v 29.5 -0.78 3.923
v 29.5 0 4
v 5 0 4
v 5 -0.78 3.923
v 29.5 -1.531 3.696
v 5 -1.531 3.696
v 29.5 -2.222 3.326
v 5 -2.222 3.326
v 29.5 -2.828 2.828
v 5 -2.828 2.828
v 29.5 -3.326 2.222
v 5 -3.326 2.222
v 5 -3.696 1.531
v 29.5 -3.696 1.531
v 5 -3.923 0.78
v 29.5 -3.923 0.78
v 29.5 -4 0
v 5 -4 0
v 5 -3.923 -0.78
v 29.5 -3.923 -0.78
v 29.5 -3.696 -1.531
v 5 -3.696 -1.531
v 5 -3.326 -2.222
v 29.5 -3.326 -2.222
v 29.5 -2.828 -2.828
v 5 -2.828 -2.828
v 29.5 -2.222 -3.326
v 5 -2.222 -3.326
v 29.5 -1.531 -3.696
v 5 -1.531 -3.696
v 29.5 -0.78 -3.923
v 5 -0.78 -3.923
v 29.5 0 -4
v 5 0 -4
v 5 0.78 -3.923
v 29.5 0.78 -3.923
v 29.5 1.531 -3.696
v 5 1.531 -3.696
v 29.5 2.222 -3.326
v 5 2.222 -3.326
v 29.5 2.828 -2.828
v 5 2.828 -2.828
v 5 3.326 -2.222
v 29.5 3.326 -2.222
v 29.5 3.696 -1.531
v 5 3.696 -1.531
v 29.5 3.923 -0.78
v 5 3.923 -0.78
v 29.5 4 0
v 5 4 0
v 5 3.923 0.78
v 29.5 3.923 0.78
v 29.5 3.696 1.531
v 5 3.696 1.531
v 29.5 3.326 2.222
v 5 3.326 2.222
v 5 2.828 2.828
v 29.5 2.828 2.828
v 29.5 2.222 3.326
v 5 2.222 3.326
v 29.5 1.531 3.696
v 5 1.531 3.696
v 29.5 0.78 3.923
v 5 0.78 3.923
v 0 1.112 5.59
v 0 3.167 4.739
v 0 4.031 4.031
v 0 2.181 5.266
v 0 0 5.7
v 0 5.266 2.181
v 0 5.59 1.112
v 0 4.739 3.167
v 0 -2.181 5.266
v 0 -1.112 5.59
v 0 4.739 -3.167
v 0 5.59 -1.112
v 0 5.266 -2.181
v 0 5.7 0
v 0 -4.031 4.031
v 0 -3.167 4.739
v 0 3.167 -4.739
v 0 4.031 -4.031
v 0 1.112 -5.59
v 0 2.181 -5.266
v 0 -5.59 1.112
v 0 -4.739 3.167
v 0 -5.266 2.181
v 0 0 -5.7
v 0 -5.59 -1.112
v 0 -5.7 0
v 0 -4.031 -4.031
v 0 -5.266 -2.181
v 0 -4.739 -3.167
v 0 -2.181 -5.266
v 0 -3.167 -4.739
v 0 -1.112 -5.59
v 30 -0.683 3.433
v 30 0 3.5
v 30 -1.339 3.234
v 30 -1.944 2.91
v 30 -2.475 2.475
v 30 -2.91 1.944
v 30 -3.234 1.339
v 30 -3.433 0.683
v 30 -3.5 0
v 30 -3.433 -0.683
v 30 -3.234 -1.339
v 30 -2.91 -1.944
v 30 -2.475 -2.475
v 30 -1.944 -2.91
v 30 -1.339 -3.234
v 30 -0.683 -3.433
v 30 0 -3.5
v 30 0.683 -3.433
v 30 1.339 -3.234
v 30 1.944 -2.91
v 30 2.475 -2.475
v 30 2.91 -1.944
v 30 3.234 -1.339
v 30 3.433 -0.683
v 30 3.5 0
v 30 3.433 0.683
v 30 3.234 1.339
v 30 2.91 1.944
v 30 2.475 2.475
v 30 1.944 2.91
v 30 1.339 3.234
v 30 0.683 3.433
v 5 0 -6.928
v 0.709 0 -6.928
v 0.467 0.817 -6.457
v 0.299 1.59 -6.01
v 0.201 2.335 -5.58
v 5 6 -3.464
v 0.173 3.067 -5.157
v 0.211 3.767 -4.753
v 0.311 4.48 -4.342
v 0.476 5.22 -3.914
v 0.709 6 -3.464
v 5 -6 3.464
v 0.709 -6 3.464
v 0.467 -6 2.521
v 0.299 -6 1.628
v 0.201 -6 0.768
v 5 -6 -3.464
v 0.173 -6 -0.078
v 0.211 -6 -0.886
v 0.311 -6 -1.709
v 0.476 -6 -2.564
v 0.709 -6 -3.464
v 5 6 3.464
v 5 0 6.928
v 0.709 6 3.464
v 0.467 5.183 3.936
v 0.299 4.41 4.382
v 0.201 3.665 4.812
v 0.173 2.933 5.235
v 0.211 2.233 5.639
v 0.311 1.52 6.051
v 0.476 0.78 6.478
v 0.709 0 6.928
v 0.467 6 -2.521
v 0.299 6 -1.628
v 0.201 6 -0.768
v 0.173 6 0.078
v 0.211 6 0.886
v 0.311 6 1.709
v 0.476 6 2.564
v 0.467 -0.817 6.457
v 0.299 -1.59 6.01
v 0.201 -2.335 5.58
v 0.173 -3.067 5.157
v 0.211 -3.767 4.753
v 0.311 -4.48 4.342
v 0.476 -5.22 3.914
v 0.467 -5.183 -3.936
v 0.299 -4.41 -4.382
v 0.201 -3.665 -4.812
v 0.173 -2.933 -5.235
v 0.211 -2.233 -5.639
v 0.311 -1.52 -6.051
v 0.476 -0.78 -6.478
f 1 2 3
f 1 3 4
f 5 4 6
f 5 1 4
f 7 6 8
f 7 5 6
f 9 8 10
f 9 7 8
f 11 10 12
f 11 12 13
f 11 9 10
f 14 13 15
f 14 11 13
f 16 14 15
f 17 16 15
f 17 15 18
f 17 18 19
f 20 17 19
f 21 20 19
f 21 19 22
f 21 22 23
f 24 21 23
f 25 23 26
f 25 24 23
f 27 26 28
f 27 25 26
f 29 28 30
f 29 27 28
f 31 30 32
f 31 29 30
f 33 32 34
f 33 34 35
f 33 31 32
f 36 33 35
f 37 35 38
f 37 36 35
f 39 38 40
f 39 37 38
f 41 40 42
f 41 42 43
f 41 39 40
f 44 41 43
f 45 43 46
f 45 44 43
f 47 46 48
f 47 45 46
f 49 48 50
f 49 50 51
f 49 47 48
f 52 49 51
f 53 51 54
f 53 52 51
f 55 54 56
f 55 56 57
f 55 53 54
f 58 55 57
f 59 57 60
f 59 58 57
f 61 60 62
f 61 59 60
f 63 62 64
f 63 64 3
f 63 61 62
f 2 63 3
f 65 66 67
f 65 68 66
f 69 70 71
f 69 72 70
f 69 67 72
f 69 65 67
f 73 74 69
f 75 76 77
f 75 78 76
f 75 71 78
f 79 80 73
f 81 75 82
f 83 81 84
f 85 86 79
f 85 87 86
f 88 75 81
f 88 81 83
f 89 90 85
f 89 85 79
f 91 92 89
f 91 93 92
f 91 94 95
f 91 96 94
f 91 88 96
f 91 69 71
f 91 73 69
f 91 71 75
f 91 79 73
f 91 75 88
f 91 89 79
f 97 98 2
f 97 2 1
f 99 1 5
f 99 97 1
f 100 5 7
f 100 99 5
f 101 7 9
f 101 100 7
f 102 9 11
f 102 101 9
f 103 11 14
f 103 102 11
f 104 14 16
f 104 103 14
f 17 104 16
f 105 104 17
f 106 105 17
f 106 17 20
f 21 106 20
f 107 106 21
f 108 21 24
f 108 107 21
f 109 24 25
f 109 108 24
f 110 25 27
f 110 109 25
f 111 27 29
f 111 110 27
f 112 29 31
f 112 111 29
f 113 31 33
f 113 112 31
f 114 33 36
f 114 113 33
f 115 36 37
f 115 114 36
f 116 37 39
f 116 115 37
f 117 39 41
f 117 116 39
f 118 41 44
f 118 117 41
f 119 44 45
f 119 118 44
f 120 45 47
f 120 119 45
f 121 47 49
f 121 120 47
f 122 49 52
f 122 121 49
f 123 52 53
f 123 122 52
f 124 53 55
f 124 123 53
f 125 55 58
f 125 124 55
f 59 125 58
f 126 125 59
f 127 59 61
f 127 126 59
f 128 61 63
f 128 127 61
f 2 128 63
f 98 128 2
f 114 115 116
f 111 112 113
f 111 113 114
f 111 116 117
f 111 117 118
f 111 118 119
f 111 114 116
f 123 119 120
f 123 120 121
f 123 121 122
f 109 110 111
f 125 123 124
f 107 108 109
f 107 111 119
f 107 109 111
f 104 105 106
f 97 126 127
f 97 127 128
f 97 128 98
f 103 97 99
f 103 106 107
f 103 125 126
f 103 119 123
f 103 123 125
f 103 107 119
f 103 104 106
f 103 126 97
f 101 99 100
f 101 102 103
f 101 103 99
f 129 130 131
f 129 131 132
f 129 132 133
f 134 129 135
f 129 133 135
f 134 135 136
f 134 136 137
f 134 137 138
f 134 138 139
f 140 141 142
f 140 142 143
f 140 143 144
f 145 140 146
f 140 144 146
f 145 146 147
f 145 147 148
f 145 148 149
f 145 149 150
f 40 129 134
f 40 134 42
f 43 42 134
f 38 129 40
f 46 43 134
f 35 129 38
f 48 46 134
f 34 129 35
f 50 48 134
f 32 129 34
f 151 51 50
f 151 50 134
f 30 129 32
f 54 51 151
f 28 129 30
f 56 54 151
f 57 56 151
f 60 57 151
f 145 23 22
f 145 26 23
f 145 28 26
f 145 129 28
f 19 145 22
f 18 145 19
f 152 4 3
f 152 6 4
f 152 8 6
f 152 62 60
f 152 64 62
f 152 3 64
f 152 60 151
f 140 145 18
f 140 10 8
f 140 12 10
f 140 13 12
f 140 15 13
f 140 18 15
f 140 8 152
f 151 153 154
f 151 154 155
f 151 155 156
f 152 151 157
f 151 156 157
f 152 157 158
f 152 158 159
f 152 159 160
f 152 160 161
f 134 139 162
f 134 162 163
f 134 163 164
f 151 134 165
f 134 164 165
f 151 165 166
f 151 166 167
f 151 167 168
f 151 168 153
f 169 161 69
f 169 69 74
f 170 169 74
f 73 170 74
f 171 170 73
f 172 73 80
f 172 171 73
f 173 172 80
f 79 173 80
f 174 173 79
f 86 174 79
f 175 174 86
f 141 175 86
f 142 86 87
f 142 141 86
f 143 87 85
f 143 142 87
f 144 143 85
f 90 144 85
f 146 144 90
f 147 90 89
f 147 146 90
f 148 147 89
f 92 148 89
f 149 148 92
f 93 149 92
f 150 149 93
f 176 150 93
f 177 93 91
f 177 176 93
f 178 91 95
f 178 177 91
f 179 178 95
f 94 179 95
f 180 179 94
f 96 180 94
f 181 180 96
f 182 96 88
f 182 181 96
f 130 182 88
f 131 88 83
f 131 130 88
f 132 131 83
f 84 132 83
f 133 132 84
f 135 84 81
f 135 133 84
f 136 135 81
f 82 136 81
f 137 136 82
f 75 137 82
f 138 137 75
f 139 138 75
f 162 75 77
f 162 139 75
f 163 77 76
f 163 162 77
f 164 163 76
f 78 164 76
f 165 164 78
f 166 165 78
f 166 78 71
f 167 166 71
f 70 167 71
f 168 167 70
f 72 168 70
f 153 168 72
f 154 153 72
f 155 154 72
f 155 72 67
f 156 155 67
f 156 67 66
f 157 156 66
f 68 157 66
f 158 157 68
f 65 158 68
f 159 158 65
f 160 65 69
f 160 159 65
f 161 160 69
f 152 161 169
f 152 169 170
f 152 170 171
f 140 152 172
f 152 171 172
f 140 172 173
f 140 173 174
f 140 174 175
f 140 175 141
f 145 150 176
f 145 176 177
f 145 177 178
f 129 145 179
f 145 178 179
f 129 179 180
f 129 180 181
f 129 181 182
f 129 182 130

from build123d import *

# Parameters (mm, degrees)
SKETCH_2_OUTSIDE_W  = 23.028
SKETCH_2_OUTSIDE_H  = 23.028
CUT_EXTRUDE_1_DEPTH = 32.560256653
CHAMFER_1_SIZE      = 0.5


with BuildPart() as part:
    # Эскиз1 → Повернуть1 (revolve)
    with BuildSketch(Plane.XY, mode=Mode.PRIVATE) as revolve_1_sk:
        Polygon((0, 0), (0, 5.7), (0.710140831, 6.93), (5, 6.93), (5, 4), (30, 4), (30, 0), align=None)
    revolve(revolve_1_sk.sketch.rotate(Axis((0, 0, 0), (1, 0, 0)), 90), axis=Axis((0, 0, 0), (1, 0, 0)))

    # Эскиз2 outside → Вырез-Вытянуть1 (cut, through all)
    with BuildSketch(Plane(origin=(0, 0, 0), x_dir=(0, 0, -1), z_dir=(1, 0, 0))):
        Rectangle(SKETCH_2_OUTSIDE_W, SKETCH_2_OUTSIDE_H)
        Polygon((6.92820323, 0), (3.464101615, 6), (-3.464101615, 6), (-6.92820323, 0), (-3.464101615, -6), (3.464101615, -6), align=None, mode=Mode.SUBTRACT)
    extrude(amount=CUT_EXTRUDE_1_DEPTH, mode=Mode.SUBTRACT)

    # Фаска1
    chamfer_1_edges = [part.edges().sort_by_distance(p)[0] for p in [
        (30, 0, -4),
    ]]
    chamfer(chamfer_1_edges, length=CHAMFER_1_SIZE)


solid = part.part
